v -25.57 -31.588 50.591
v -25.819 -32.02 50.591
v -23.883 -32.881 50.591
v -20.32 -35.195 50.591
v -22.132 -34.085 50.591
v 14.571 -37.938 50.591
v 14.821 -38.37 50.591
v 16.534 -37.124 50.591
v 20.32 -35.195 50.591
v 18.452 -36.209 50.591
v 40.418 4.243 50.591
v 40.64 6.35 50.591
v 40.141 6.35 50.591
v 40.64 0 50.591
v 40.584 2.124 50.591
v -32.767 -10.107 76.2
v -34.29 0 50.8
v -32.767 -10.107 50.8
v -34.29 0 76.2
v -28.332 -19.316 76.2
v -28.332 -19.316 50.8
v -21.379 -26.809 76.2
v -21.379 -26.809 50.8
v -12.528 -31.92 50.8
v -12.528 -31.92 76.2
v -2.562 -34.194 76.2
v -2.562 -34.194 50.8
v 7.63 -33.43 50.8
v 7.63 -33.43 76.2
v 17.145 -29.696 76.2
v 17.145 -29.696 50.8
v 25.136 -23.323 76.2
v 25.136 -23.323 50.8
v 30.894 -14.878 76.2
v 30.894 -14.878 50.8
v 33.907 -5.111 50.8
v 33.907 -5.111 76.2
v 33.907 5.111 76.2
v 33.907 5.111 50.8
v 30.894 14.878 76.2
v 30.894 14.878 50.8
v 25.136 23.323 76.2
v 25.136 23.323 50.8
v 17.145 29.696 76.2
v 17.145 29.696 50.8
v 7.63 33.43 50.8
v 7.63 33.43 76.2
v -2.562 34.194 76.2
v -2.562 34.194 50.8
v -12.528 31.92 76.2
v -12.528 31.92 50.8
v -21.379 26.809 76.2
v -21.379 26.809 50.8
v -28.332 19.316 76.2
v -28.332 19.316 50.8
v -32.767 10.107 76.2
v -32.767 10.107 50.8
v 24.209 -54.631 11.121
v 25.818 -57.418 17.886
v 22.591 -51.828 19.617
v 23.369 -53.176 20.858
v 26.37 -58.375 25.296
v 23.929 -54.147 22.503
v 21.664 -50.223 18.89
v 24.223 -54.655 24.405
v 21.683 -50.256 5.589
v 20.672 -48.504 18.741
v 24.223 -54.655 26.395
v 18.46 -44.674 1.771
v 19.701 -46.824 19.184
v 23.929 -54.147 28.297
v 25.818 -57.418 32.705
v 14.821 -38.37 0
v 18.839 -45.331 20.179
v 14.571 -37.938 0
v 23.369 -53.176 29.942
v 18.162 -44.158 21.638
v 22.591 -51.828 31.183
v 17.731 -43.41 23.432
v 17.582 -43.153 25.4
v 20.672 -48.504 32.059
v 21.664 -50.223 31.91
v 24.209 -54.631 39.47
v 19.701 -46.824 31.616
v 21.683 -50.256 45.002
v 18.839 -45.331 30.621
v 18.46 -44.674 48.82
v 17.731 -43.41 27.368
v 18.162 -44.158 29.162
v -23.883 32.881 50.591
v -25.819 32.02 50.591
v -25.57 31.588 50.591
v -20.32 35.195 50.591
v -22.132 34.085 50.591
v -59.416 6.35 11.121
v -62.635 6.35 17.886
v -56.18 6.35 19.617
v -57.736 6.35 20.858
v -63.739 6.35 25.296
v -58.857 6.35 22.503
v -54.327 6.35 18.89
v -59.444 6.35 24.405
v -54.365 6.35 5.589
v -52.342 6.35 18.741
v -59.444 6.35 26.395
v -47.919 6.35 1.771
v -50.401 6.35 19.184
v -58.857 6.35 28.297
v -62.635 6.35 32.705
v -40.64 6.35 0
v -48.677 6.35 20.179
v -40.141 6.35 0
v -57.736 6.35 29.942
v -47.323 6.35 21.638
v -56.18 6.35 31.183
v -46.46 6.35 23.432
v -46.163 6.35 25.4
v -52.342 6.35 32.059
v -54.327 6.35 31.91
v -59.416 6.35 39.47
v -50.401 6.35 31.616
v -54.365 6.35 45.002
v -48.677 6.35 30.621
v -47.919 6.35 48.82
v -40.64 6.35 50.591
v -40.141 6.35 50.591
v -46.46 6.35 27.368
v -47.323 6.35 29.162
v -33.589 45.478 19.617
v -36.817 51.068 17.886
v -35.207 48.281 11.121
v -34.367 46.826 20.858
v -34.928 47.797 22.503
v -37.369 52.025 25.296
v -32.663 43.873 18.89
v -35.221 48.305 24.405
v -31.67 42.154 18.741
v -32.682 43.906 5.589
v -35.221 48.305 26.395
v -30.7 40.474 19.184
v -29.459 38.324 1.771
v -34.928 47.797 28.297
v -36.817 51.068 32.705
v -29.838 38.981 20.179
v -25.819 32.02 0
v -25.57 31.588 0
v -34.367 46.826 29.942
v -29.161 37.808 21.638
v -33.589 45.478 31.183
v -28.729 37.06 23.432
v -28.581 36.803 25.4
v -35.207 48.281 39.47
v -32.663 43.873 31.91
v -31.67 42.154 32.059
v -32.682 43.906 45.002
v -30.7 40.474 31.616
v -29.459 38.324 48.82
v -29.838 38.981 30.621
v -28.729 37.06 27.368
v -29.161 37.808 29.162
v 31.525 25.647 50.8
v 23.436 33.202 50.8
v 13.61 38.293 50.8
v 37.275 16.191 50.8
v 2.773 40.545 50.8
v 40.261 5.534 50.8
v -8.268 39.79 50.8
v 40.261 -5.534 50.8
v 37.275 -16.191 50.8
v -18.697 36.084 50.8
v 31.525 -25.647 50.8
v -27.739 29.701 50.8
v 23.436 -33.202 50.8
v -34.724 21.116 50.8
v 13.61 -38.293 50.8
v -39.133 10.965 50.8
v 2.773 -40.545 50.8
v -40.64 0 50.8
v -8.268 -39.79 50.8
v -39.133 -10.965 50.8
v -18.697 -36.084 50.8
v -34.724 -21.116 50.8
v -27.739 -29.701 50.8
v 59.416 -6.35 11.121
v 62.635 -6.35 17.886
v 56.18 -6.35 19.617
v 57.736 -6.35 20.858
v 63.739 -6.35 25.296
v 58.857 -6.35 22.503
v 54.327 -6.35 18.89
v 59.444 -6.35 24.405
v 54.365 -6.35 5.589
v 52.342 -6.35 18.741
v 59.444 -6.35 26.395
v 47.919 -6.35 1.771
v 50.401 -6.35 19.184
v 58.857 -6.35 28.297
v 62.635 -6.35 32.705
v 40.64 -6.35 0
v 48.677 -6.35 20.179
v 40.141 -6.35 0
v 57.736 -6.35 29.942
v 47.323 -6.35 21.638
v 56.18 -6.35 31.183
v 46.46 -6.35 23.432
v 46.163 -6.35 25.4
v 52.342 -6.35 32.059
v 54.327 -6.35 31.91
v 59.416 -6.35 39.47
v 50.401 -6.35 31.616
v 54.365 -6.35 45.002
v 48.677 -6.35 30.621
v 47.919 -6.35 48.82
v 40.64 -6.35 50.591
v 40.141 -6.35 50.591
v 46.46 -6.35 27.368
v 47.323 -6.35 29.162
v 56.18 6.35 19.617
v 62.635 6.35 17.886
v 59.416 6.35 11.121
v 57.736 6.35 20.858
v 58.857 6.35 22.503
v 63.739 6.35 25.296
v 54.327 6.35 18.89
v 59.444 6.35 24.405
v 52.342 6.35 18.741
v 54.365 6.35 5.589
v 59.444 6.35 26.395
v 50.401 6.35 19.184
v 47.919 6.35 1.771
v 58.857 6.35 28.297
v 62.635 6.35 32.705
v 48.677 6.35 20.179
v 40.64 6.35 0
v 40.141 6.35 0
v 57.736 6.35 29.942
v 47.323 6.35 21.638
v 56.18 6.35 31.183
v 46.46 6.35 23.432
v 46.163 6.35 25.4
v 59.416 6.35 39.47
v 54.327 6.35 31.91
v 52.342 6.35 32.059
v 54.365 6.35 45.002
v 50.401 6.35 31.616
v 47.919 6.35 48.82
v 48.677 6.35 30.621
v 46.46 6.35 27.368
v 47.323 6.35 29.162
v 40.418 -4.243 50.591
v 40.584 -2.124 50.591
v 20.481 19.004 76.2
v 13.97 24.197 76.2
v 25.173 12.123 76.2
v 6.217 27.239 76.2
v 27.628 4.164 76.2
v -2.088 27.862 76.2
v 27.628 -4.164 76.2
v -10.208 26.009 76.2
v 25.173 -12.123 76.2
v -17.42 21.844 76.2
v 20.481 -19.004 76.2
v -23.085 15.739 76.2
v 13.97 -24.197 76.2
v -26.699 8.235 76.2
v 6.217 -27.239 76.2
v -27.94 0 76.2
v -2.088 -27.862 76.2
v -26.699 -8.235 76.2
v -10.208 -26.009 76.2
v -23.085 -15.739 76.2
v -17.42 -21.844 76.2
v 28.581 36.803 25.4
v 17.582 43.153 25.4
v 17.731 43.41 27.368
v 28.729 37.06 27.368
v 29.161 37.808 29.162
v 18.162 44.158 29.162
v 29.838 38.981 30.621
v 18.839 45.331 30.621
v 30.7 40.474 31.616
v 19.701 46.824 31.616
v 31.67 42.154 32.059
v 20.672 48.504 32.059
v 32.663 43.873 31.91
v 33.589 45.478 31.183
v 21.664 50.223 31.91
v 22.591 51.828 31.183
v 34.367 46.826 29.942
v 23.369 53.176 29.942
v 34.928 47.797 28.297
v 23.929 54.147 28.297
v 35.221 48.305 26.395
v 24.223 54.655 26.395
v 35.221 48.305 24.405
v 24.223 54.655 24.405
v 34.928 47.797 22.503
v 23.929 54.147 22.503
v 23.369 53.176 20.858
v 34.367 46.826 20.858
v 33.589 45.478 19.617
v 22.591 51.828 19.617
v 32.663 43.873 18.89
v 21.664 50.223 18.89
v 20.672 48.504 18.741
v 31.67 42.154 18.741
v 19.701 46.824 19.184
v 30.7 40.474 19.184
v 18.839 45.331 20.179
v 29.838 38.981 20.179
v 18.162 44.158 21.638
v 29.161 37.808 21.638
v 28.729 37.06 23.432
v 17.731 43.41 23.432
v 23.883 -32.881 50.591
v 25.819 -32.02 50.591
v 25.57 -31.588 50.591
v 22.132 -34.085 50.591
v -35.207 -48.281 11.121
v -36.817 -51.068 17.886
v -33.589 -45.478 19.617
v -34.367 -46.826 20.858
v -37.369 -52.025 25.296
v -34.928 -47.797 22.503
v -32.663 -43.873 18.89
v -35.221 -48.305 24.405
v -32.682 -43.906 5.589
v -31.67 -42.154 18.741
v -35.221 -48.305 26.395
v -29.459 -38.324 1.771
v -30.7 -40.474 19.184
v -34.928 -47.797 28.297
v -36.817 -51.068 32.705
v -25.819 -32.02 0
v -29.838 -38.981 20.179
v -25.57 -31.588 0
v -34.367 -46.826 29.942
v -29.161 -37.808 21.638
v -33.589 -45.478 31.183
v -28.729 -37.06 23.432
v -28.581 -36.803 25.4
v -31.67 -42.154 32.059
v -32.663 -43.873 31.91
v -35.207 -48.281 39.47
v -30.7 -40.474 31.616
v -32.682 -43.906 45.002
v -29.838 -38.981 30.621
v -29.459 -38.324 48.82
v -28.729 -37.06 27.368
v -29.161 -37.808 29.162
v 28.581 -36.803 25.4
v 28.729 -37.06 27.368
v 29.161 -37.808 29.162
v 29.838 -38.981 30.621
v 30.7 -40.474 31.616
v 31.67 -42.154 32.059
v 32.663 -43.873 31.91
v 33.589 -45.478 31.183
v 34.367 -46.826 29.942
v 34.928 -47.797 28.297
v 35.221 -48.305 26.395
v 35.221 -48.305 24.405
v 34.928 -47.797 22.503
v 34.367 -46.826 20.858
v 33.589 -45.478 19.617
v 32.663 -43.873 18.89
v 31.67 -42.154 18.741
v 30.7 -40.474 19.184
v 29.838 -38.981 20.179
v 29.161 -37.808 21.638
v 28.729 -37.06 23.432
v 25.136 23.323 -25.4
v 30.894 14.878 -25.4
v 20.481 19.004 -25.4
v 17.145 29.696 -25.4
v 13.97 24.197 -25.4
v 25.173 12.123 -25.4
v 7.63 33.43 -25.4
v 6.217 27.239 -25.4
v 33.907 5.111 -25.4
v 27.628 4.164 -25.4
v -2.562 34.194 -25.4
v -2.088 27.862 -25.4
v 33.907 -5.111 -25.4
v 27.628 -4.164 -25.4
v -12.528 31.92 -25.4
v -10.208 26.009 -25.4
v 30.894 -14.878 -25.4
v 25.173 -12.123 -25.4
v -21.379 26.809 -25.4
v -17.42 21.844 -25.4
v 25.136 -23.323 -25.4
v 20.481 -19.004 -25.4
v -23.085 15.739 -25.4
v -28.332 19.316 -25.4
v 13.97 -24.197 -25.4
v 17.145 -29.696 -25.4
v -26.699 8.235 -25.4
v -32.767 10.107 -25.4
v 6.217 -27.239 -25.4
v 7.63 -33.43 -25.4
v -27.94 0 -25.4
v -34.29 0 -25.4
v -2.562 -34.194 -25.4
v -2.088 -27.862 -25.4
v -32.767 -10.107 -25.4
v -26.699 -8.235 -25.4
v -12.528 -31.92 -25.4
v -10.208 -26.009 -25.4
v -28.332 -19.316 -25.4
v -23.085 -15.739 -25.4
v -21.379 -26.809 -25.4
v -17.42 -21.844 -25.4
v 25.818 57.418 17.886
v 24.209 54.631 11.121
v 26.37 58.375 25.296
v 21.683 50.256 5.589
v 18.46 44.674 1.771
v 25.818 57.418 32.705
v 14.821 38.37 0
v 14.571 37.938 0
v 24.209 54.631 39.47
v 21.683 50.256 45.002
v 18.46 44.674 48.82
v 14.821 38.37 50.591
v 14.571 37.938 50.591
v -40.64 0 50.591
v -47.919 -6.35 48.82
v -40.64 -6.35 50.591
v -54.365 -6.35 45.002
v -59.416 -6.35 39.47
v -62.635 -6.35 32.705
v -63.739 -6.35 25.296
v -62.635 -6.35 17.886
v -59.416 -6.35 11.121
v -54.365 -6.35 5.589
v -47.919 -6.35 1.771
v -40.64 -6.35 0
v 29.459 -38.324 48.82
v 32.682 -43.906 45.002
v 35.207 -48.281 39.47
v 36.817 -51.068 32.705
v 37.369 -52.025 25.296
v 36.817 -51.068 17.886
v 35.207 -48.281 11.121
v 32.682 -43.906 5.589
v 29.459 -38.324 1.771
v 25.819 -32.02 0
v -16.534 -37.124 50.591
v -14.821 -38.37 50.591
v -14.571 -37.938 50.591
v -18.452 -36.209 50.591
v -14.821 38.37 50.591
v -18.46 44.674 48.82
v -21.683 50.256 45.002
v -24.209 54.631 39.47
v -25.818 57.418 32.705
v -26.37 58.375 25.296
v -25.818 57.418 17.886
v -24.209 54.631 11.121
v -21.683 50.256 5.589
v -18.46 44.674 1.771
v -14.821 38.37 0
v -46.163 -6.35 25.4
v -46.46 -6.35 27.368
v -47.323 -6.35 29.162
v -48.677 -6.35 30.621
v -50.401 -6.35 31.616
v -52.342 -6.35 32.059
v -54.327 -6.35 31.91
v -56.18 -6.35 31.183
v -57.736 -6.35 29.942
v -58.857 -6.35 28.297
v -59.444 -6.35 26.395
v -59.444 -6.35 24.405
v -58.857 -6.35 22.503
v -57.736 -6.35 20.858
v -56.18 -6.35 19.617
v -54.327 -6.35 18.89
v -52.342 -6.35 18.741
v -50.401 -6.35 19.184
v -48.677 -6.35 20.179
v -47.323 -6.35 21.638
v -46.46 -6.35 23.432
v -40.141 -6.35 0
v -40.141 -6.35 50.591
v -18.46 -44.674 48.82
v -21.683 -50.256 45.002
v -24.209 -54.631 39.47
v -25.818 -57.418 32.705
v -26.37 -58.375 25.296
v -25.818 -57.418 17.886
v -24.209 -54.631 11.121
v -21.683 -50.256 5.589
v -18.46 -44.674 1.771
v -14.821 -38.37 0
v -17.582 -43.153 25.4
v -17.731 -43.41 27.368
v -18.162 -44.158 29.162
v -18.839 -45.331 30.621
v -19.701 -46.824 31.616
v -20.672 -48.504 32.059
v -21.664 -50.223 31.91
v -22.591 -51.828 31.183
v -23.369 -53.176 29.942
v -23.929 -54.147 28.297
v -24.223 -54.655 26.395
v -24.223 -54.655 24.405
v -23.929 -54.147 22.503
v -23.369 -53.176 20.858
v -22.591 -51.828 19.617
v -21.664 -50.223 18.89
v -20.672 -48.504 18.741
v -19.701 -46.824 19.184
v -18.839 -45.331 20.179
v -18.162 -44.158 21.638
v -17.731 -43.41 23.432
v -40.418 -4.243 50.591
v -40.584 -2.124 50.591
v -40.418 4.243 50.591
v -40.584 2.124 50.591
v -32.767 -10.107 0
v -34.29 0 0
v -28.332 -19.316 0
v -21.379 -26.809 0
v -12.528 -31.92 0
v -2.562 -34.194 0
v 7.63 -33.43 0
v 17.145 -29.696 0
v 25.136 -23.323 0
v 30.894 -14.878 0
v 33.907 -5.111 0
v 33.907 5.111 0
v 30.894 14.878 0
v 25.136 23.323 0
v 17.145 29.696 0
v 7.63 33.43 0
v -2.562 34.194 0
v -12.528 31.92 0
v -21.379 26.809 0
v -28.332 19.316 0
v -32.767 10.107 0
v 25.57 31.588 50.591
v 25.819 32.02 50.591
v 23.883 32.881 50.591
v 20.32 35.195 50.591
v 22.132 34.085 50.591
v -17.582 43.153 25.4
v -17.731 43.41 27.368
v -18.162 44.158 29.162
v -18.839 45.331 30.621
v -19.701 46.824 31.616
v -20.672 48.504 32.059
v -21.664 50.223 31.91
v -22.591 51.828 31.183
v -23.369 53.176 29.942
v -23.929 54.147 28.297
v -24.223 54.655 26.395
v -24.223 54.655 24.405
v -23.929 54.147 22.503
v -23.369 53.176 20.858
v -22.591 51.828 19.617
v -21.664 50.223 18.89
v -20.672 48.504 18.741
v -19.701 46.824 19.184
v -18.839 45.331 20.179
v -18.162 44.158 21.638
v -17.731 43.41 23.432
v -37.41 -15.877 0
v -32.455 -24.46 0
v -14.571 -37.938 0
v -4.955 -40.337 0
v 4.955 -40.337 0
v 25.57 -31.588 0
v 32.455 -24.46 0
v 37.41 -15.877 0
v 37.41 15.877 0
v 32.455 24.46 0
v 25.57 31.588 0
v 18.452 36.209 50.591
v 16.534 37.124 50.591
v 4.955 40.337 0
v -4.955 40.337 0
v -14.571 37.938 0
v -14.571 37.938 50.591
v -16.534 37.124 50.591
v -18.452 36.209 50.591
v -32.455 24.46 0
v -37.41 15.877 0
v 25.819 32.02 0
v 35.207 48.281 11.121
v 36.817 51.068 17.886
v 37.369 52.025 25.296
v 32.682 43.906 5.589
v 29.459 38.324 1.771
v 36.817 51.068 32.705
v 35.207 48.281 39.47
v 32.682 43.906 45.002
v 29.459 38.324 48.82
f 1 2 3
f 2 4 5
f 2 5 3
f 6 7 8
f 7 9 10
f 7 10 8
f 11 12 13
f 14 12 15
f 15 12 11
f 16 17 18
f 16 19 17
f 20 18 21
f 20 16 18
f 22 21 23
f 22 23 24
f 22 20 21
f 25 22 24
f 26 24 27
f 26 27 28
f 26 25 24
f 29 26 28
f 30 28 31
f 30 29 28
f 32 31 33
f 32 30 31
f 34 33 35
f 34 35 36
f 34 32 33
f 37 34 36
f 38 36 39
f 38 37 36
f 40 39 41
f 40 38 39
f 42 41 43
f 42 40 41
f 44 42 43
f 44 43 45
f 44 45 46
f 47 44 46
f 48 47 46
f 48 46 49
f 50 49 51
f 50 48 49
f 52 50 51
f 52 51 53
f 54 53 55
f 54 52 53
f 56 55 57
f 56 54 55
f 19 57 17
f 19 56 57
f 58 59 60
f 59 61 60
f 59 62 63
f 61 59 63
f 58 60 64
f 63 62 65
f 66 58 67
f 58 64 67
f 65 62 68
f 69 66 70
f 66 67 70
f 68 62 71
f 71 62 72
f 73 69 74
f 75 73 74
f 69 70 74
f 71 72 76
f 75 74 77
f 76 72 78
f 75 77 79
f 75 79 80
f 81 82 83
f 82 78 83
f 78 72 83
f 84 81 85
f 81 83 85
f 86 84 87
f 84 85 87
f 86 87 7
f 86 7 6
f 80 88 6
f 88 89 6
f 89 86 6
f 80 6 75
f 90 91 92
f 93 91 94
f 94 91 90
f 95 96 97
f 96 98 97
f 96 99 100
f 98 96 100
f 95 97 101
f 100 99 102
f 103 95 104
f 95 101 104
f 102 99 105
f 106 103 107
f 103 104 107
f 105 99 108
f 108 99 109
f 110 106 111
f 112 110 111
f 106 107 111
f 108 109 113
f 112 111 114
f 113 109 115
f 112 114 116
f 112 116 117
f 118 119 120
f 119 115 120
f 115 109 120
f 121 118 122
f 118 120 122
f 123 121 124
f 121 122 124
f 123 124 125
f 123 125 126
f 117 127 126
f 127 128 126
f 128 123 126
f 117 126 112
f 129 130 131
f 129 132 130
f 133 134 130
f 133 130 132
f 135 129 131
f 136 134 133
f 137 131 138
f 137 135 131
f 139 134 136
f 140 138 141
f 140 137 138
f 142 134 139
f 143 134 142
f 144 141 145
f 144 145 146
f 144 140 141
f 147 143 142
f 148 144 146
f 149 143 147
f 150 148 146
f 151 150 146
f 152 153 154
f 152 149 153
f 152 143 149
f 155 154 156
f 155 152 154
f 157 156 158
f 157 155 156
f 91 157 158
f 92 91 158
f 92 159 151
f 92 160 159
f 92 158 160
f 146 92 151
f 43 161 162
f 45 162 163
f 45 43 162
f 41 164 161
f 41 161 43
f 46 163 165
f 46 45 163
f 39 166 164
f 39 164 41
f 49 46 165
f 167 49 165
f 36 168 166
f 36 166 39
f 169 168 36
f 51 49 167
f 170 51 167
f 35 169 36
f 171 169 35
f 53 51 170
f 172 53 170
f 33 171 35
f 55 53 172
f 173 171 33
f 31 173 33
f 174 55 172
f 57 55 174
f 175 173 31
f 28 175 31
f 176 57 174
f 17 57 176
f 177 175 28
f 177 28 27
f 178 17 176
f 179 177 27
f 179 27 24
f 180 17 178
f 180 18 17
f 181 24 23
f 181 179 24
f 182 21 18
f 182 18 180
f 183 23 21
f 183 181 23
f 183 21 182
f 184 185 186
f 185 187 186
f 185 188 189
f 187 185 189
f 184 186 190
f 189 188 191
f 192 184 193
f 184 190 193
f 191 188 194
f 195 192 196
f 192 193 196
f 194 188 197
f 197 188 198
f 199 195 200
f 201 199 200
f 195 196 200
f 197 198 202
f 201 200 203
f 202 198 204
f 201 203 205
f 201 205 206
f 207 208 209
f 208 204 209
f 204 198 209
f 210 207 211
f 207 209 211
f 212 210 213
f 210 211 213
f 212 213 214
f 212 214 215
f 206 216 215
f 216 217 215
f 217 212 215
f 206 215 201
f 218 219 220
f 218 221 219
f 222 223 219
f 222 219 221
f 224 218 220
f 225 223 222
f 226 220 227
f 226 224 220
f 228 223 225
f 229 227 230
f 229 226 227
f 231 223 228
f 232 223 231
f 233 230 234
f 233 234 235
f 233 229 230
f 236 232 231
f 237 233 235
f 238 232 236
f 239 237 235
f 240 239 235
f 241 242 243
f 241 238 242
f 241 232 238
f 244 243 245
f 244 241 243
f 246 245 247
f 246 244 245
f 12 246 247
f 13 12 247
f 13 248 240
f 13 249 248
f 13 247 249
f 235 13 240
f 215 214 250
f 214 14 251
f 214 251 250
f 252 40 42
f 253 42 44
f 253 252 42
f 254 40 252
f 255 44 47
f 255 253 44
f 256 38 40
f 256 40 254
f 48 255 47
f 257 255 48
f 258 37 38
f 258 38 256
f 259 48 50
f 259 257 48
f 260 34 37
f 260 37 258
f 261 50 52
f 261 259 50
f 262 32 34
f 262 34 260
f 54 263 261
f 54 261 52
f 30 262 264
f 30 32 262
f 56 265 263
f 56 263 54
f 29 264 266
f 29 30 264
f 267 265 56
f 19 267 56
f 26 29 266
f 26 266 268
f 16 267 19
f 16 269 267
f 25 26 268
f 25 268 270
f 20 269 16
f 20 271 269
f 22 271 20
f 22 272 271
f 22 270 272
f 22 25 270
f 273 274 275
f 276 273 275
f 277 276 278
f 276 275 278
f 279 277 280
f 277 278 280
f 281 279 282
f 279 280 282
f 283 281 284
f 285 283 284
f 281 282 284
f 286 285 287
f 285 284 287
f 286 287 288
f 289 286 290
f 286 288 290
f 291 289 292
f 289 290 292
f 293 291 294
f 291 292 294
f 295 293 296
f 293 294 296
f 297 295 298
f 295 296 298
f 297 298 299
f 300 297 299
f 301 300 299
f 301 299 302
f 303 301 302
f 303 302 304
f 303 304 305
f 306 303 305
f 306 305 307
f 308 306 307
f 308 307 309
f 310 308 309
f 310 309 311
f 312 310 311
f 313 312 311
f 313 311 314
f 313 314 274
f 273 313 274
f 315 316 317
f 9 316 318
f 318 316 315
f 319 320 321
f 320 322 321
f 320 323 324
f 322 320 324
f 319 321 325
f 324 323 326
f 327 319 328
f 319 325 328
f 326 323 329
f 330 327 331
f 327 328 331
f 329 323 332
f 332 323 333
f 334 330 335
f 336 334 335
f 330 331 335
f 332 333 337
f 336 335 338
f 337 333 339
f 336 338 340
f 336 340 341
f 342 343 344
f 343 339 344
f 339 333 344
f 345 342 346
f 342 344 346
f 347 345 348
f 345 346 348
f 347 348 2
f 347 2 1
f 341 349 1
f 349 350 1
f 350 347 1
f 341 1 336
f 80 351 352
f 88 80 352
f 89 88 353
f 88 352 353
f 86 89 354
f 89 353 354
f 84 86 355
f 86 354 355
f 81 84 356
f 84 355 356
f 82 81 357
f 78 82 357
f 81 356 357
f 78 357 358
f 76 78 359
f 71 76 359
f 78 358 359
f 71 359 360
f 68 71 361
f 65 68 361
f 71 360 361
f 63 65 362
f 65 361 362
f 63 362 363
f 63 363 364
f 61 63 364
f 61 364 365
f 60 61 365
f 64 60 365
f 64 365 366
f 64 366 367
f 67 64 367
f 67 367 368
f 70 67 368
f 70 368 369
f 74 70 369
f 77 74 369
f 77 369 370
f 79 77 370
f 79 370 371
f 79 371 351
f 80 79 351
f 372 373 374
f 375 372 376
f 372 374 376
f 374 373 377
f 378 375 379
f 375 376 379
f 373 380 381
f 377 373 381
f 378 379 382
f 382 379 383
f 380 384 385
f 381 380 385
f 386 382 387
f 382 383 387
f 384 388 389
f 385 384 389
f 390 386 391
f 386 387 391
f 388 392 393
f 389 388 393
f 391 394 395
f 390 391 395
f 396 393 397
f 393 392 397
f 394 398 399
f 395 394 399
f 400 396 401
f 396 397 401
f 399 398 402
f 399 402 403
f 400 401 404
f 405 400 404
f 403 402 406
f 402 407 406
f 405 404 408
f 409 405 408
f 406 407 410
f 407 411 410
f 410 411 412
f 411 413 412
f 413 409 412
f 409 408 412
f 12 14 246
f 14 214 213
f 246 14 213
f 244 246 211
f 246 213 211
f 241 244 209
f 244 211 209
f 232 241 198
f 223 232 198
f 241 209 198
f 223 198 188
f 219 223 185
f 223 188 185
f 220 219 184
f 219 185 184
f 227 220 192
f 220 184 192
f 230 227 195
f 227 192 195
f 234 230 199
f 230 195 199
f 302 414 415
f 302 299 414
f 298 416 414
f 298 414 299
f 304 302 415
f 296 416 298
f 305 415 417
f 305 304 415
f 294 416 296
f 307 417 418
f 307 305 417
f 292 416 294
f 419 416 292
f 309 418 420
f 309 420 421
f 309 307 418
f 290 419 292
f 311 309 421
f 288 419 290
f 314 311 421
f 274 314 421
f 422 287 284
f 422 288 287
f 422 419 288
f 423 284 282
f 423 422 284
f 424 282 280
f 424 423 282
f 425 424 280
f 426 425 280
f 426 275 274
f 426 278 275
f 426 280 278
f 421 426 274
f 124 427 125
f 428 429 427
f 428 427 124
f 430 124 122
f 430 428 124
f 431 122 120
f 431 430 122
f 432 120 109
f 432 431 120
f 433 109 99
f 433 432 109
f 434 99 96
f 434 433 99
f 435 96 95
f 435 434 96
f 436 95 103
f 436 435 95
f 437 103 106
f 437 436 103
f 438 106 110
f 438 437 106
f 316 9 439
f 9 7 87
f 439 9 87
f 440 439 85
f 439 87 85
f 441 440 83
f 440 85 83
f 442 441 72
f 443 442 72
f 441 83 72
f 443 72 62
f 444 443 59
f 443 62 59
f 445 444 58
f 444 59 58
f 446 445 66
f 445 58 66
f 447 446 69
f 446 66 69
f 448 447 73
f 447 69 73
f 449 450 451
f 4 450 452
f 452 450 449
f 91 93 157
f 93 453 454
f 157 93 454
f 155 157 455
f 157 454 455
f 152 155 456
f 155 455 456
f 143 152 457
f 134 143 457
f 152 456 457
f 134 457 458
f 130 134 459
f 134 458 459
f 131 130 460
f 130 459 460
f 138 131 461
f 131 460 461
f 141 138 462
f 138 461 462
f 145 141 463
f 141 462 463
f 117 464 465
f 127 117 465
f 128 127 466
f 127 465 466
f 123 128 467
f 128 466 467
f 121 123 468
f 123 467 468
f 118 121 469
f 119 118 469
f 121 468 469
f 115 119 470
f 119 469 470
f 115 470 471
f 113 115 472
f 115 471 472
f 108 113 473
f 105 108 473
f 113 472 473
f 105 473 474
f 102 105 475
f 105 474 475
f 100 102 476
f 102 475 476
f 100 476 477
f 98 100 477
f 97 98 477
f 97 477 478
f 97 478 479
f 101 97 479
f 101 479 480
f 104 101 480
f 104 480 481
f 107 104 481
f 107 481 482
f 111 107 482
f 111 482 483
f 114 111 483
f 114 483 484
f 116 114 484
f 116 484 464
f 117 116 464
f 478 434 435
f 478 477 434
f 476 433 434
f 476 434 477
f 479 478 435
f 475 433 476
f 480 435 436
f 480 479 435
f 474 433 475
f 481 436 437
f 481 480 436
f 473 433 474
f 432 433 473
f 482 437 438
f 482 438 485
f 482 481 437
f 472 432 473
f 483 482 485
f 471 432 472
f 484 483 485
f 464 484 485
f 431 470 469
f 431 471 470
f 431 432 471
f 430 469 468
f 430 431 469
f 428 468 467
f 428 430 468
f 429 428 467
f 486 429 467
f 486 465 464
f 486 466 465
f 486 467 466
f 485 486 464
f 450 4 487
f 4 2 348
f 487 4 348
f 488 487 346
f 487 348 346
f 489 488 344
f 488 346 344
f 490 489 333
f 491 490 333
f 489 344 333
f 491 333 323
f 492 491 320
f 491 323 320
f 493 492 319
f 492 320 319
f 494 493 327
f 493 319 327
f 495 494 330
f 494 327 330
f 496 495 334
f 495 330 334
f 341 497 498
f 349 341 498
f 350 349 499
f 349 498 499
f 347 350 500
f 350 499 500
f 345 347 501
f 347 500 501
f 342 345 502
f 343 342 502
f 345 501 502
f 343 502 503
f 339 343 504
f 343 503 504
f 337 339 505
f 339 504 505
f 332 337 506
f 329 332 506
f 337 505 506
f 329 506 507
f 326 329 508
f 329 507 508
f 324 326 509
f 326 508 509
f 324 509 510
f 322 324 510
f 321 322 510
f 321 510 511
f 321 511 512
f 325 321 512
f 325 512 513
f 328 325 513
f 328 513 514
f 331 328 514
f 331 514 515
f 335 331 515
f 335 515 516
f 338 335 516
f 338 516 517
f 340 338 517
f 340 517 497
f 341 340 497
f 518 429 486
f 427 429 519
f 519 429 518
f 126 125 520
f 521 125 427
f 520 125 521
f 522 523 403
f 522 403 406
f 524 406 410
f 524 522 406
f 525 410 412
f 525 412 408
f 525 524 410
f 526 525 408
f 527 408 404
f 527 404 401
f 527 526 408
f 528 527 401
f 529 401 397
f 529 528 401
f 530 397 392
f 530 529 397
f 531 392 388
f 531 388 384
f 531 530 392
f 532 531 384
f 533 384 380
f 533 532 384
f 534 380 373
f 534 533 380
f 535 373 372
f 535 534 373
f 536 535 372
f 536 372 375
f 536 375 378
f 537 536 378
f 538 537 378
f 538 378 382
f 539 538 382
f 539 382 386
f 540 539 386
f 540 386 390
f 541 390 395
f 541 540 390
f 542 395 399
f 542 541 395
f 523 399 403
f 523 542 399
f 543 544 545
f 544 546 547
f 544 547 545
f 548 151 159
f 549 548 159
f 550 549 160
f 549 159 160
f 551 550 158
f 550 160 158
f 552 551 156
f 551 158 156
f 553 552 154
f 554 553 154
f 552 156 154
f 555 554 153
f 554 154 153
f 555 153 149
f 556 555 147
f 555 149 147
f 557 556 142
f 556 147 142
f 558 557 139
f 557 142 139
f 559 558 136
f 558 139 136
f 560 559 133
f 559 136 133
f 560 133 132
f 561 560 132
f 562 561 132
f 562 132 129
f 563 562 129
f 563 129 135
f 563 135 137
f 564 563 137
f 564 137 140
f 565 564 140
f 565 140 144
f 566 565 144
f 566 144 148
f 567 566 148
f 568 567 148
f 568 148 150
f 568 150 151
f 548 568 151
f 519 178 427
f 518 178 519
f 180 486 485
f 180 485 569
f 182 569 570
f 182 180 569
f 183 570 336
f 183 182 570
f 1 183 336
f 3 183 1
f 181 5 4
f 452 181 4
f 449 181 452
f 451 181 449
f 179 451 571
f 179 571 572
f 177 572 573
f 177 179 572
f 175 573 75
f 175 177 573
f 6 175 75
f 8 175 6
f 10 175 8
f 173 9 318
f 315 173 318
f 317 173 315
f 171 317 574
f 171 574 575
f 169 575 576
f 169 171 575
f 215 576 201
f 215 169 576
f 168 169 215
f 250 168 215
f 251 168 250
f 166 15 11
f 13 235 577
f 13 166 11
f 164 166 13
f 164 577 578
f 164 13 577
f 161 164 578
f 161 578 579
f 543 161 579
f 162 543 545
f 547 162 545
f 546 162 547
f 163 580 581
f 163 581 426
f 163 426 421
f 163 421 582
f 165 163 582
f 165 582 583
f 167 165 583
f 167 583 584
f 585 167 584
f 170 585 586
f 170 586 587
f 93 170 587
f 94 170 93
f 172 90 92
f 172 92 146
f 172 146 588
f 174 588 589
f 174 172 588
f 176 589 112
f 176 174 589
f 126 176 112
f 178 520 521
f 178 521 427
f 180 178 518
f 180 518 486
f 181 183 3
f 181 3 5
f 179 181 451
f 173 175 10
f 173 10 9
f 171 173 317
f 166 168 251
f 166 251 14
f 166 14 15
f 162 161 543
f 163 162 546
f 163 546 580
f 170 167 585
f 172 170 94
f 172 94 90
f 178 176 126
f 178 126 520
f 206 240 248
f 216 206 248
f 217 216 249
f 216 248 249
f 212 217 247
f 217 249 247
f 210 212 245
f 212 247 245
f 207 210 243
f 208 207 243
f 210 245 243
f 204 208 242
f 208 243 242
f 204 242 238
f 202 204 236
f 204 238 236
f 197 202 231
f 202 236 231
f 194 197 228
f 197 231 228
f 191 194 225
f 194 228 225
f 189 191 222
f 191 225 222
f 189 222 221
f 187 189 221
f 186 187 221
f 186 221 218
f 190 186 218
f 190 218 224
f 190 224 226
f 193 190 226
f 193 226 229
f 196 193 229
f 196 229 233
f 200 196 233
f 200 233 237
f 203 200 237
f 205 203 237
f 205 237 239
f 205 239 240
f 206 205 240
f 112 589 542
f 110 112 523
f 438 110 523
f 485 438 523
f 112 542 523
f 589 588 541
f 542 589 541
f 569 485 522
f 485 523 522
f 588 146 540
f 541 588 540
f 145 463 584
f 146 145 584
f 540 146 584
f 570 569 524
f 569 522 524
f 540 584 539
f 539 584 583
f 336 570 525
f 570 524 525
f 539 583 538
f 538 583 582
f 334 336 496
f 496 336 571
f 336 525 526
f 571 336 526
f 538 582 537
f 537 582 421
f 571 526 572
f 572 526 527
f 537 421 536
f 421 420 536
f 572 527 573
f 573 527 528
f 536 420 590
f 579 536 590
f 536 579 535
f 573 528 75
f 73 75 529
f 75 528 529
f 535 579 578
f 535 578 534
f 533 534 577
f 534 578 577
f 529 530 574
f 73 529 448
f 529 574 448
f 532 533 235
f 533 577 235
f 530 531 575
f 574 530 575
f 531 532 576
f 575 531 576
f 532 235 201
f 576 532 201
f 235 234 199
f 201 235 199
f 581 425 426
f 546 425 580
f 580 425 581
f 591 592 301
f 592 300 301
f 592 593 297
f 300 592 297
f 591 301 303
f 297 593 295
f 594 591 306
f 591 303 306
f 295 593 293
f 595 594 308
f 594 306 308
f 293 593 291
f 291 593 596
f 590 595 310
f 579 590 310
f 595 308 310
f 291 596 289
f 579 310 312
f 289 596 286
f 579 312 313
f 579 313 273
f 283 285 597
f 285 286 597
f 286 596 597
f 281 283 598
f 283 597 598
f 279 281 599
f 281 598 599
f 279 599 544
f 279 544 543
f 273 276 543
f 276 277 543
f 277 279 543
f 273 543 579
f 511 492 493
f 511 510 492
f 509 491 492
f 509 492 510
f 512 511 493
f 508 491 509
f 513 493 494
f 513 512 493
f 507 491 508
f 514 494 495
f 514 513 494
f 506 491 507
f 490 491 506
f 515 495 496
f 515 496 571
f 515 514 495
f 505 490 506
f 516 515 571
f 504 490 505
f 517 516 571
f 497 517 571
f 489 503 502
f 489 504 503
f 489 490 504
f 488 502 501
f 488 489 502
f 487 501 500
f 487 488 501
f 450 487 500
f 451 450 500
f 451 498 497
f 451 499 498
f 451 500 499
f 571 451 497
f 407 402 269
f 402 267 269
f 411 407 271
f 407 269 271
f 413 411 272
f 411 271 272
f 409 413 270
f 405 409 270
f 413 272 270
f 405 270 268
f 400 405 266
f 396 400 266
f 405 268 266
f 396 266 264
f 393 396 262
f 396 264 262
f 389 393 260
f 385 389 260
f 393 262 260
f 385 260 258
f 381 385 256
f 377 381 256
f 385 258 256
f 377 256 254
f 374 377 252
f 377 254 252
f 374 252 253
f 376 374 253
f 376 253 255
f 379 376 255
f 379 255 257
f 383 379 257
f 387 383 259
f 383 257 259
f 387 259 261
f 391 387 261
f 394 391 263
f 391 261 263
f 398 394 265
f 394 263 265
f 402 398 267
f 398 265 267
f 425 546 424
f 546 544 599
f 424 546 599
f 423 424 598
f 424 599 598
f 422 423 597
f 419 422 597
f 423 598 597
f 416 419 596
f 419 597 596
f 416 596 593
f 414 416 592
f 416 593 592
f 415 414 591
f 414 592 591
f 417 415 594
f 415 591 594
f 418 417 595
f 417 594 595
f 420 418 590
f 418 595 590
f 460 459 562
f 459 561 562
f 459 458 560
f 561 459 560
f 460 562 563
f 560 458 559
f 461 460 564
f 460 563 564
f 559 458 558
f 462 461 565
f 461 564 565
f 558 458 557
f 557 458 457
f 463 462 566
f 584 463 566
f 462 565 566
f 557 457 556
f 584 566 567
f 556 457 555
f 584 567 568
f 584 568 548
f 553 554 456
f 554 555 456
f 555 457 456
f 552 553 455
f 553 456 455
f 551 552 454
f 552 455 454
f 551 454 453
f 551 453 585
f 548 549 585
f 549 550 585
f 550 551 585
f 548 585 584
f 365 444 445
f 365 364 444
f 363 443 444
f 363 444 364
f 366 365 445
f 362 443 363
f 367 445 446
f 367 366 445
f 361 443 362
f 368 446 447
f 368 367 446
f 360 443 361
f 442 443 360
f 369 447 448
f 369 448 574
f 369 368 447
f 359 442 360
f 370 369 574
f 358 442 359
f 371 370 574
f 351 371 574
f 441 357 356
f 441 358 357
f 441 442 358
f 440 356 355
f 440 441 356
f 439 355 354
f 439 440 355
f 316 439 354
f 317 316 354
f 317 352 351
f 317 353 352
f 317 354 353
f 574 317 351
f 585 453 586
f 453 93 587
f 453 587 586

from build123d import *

# Parameters (mm, degrees)
F0_W            = 12.7
F0_H            = 50.8
F2_W            = 5.08
F2_H            = 50.5912028922
F3_DEPTH        = 6.35
F3_DEPTH_BACK   = 6.35
F3_COPIES_COUNT = 6
F4_R            = 6.6777820133
F5_DEPTH        = 25.4
F5_COPIES_COUNT = 6
F7_W            = 6.35
F7_H            = 101.6


# Not quite as in the source:
# - a pattern or mirror of a feature is missing from the dataset's text; its kind, count and spacing are read off the source's solid


with BuildPart() as f1:
    # F0 (on Front) → F1 (revolve)
    with BuildSketch(Plane.XZ):
        with Locations((-34.29, 25.4)):
            Rectangle(F0_W, F0_H)
    revolve(axis=Axis((0, 0, 19.3039998412), (0, 0, 1)))

    # F2 (on Front) → F3 (join, two sides)
    with BuildSketch(Plane.XZ) as f3_sk:
        with BuildLine():
            Line((-40.64, 0), (-40.64, 50.5912028922))
            ThreePointArc((-40.64, 50.5912028922), (-63.7394462668, 25.2956014461), (-40.64, 0))
        make_face()
        with Locations((-38.1, 25.2956014461)):
            Rectangle(F2_W, F2_H)
    f3 = extrude(amount=F3_DEPTH) + extrude(f3_sk.sketch, amount=-F3_DEPTH_BACK)

    # F3_copies: F3 ×6 about axis
    f3_copies_axis = Axis((0, 0, 0), (0, 0, 1))
    for i in range(1, F3_COPIES_COUNT):
        add(f3.rotate(f3_copies_axis, i * 360 / F3_COPIES_COUNT))

    # F4 (on face) → F5 (cut)
    with BuildSketch(Plane.XZ.offset(6.35)):
        with Locations((-52.8408407984, 25.4)):
            Circle(F4_R)
    f5 = extrude(amount=-F5_DEPTH, mode=Mode.SUBTRACT)

    # F5_copies: F5 ×6 about axis
    f5_copies_axis = Axis((0, 0, 0), (0, 0, 1))
    for i in range(1, F5_COPIES_COUNT):
        add(f5.rotate(f5_copies_axis, i * 360 / F5_COPIES_COUNT), mode=Mode.SUBTRACT)

    # F7 (on Front) → F8 (revolve)
    with BuildSketch(Plane.XZ):
        with Locations((-31.115, 25.4)):
            Rectangle(F7_W, F7_H)
    revolve(axis=Axis((0, 0, 73.8201290369), (0, 0, 1)))


solid = f1.part
